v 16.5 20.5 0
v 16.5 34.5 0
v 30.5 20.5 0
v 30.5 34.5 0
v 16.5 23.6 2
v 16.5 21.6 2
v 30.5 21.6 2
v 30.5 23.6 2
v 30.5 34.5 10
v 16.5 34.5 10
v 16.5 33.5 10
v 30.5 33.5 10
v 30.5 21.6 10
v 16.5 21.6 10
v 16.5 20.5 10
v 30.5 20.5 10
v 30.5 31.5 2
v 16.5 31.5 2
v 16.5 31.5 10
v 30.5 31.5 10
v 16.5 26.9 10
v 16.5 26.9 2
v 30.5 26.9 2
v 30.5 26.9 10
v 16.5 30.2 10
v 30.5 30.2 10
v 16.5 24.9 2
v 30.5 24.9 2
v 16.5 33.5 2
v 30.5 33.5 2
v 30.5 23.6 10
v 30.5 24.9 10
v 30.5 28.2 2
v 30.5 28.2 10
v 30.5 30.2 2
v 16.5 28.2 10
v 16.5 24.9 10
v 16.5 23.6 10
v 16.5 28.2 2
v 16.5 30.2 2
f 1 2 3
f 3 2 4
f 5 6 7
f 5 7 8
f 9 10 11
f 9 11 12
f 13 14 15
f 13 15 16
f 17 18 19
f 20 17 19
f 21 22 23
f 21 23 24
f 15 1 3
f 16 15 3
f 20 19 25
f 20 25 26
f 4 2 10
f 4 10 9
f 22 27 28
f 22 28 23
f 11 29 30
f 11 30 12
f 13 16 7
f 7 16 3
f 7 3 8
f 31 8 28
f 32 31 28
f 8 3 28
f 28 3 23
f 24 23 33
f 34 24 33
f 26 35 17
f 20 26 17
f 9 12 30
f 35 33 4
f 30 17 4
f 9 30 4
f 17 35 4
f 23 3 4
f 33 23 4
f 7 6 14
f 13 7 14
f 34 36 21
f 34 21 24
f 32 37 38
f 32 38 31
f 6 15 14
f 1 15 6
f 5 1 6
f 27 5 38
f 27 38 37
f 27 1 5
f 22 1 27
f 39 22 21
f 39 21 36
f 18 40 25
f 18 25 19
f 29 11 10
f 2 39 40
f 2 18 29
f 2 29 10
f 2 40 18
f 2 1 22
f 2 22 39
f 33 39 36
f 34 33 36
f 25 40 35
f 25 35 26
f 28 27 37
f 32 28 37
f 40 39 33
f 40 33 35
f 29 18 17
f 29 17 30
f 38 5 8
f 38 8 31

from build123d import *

# Parameters (mm, degrees)
SKETCH1_W           = 14
SKETCH1_H           = 14
BOSS_EXTRUDE1_DEPTH = 10
SKETCH2_W           = 8
SKETCH2_H           = 2
CUT_EXTRUDE1_DEPTH  = 15


with BuildPart() as part:
    # Sketch1 → Boss-Extrude1 (new body)
    with BuildSketch(Plane.XY):
        with Locations((23.5, 27.5)):
            Rectangle(SKETCH1_W, SKETCH1_H)
    extrude(amount=BOSS_EXTRUDE1_DEPTH)

    # Sketch2 → Cut-Extrude1 (cut, through all)
    with BuildSketch(Plane.ZY.offset(-16.5)):
        with Locations((6, 32.5)):
            Rectangle(SKETCH2_W, SKETCH2_H)
        with Locations((6, 29.2)):
            Rectangle(SKETCH2_W, SKETCH2_H)
        with Locations((6, 25.9)):
            Rectangle(SKETCH2_W, SKETCH2_H)
        with Locations((6, 22.6)):
            Rectangle(SKETCH2_W, SKETCH2_H)
    extrude(amount=-CUT_EXTRUDE1_DEPTH, mode=Mode.SUBTRACT)


solid = part.part
